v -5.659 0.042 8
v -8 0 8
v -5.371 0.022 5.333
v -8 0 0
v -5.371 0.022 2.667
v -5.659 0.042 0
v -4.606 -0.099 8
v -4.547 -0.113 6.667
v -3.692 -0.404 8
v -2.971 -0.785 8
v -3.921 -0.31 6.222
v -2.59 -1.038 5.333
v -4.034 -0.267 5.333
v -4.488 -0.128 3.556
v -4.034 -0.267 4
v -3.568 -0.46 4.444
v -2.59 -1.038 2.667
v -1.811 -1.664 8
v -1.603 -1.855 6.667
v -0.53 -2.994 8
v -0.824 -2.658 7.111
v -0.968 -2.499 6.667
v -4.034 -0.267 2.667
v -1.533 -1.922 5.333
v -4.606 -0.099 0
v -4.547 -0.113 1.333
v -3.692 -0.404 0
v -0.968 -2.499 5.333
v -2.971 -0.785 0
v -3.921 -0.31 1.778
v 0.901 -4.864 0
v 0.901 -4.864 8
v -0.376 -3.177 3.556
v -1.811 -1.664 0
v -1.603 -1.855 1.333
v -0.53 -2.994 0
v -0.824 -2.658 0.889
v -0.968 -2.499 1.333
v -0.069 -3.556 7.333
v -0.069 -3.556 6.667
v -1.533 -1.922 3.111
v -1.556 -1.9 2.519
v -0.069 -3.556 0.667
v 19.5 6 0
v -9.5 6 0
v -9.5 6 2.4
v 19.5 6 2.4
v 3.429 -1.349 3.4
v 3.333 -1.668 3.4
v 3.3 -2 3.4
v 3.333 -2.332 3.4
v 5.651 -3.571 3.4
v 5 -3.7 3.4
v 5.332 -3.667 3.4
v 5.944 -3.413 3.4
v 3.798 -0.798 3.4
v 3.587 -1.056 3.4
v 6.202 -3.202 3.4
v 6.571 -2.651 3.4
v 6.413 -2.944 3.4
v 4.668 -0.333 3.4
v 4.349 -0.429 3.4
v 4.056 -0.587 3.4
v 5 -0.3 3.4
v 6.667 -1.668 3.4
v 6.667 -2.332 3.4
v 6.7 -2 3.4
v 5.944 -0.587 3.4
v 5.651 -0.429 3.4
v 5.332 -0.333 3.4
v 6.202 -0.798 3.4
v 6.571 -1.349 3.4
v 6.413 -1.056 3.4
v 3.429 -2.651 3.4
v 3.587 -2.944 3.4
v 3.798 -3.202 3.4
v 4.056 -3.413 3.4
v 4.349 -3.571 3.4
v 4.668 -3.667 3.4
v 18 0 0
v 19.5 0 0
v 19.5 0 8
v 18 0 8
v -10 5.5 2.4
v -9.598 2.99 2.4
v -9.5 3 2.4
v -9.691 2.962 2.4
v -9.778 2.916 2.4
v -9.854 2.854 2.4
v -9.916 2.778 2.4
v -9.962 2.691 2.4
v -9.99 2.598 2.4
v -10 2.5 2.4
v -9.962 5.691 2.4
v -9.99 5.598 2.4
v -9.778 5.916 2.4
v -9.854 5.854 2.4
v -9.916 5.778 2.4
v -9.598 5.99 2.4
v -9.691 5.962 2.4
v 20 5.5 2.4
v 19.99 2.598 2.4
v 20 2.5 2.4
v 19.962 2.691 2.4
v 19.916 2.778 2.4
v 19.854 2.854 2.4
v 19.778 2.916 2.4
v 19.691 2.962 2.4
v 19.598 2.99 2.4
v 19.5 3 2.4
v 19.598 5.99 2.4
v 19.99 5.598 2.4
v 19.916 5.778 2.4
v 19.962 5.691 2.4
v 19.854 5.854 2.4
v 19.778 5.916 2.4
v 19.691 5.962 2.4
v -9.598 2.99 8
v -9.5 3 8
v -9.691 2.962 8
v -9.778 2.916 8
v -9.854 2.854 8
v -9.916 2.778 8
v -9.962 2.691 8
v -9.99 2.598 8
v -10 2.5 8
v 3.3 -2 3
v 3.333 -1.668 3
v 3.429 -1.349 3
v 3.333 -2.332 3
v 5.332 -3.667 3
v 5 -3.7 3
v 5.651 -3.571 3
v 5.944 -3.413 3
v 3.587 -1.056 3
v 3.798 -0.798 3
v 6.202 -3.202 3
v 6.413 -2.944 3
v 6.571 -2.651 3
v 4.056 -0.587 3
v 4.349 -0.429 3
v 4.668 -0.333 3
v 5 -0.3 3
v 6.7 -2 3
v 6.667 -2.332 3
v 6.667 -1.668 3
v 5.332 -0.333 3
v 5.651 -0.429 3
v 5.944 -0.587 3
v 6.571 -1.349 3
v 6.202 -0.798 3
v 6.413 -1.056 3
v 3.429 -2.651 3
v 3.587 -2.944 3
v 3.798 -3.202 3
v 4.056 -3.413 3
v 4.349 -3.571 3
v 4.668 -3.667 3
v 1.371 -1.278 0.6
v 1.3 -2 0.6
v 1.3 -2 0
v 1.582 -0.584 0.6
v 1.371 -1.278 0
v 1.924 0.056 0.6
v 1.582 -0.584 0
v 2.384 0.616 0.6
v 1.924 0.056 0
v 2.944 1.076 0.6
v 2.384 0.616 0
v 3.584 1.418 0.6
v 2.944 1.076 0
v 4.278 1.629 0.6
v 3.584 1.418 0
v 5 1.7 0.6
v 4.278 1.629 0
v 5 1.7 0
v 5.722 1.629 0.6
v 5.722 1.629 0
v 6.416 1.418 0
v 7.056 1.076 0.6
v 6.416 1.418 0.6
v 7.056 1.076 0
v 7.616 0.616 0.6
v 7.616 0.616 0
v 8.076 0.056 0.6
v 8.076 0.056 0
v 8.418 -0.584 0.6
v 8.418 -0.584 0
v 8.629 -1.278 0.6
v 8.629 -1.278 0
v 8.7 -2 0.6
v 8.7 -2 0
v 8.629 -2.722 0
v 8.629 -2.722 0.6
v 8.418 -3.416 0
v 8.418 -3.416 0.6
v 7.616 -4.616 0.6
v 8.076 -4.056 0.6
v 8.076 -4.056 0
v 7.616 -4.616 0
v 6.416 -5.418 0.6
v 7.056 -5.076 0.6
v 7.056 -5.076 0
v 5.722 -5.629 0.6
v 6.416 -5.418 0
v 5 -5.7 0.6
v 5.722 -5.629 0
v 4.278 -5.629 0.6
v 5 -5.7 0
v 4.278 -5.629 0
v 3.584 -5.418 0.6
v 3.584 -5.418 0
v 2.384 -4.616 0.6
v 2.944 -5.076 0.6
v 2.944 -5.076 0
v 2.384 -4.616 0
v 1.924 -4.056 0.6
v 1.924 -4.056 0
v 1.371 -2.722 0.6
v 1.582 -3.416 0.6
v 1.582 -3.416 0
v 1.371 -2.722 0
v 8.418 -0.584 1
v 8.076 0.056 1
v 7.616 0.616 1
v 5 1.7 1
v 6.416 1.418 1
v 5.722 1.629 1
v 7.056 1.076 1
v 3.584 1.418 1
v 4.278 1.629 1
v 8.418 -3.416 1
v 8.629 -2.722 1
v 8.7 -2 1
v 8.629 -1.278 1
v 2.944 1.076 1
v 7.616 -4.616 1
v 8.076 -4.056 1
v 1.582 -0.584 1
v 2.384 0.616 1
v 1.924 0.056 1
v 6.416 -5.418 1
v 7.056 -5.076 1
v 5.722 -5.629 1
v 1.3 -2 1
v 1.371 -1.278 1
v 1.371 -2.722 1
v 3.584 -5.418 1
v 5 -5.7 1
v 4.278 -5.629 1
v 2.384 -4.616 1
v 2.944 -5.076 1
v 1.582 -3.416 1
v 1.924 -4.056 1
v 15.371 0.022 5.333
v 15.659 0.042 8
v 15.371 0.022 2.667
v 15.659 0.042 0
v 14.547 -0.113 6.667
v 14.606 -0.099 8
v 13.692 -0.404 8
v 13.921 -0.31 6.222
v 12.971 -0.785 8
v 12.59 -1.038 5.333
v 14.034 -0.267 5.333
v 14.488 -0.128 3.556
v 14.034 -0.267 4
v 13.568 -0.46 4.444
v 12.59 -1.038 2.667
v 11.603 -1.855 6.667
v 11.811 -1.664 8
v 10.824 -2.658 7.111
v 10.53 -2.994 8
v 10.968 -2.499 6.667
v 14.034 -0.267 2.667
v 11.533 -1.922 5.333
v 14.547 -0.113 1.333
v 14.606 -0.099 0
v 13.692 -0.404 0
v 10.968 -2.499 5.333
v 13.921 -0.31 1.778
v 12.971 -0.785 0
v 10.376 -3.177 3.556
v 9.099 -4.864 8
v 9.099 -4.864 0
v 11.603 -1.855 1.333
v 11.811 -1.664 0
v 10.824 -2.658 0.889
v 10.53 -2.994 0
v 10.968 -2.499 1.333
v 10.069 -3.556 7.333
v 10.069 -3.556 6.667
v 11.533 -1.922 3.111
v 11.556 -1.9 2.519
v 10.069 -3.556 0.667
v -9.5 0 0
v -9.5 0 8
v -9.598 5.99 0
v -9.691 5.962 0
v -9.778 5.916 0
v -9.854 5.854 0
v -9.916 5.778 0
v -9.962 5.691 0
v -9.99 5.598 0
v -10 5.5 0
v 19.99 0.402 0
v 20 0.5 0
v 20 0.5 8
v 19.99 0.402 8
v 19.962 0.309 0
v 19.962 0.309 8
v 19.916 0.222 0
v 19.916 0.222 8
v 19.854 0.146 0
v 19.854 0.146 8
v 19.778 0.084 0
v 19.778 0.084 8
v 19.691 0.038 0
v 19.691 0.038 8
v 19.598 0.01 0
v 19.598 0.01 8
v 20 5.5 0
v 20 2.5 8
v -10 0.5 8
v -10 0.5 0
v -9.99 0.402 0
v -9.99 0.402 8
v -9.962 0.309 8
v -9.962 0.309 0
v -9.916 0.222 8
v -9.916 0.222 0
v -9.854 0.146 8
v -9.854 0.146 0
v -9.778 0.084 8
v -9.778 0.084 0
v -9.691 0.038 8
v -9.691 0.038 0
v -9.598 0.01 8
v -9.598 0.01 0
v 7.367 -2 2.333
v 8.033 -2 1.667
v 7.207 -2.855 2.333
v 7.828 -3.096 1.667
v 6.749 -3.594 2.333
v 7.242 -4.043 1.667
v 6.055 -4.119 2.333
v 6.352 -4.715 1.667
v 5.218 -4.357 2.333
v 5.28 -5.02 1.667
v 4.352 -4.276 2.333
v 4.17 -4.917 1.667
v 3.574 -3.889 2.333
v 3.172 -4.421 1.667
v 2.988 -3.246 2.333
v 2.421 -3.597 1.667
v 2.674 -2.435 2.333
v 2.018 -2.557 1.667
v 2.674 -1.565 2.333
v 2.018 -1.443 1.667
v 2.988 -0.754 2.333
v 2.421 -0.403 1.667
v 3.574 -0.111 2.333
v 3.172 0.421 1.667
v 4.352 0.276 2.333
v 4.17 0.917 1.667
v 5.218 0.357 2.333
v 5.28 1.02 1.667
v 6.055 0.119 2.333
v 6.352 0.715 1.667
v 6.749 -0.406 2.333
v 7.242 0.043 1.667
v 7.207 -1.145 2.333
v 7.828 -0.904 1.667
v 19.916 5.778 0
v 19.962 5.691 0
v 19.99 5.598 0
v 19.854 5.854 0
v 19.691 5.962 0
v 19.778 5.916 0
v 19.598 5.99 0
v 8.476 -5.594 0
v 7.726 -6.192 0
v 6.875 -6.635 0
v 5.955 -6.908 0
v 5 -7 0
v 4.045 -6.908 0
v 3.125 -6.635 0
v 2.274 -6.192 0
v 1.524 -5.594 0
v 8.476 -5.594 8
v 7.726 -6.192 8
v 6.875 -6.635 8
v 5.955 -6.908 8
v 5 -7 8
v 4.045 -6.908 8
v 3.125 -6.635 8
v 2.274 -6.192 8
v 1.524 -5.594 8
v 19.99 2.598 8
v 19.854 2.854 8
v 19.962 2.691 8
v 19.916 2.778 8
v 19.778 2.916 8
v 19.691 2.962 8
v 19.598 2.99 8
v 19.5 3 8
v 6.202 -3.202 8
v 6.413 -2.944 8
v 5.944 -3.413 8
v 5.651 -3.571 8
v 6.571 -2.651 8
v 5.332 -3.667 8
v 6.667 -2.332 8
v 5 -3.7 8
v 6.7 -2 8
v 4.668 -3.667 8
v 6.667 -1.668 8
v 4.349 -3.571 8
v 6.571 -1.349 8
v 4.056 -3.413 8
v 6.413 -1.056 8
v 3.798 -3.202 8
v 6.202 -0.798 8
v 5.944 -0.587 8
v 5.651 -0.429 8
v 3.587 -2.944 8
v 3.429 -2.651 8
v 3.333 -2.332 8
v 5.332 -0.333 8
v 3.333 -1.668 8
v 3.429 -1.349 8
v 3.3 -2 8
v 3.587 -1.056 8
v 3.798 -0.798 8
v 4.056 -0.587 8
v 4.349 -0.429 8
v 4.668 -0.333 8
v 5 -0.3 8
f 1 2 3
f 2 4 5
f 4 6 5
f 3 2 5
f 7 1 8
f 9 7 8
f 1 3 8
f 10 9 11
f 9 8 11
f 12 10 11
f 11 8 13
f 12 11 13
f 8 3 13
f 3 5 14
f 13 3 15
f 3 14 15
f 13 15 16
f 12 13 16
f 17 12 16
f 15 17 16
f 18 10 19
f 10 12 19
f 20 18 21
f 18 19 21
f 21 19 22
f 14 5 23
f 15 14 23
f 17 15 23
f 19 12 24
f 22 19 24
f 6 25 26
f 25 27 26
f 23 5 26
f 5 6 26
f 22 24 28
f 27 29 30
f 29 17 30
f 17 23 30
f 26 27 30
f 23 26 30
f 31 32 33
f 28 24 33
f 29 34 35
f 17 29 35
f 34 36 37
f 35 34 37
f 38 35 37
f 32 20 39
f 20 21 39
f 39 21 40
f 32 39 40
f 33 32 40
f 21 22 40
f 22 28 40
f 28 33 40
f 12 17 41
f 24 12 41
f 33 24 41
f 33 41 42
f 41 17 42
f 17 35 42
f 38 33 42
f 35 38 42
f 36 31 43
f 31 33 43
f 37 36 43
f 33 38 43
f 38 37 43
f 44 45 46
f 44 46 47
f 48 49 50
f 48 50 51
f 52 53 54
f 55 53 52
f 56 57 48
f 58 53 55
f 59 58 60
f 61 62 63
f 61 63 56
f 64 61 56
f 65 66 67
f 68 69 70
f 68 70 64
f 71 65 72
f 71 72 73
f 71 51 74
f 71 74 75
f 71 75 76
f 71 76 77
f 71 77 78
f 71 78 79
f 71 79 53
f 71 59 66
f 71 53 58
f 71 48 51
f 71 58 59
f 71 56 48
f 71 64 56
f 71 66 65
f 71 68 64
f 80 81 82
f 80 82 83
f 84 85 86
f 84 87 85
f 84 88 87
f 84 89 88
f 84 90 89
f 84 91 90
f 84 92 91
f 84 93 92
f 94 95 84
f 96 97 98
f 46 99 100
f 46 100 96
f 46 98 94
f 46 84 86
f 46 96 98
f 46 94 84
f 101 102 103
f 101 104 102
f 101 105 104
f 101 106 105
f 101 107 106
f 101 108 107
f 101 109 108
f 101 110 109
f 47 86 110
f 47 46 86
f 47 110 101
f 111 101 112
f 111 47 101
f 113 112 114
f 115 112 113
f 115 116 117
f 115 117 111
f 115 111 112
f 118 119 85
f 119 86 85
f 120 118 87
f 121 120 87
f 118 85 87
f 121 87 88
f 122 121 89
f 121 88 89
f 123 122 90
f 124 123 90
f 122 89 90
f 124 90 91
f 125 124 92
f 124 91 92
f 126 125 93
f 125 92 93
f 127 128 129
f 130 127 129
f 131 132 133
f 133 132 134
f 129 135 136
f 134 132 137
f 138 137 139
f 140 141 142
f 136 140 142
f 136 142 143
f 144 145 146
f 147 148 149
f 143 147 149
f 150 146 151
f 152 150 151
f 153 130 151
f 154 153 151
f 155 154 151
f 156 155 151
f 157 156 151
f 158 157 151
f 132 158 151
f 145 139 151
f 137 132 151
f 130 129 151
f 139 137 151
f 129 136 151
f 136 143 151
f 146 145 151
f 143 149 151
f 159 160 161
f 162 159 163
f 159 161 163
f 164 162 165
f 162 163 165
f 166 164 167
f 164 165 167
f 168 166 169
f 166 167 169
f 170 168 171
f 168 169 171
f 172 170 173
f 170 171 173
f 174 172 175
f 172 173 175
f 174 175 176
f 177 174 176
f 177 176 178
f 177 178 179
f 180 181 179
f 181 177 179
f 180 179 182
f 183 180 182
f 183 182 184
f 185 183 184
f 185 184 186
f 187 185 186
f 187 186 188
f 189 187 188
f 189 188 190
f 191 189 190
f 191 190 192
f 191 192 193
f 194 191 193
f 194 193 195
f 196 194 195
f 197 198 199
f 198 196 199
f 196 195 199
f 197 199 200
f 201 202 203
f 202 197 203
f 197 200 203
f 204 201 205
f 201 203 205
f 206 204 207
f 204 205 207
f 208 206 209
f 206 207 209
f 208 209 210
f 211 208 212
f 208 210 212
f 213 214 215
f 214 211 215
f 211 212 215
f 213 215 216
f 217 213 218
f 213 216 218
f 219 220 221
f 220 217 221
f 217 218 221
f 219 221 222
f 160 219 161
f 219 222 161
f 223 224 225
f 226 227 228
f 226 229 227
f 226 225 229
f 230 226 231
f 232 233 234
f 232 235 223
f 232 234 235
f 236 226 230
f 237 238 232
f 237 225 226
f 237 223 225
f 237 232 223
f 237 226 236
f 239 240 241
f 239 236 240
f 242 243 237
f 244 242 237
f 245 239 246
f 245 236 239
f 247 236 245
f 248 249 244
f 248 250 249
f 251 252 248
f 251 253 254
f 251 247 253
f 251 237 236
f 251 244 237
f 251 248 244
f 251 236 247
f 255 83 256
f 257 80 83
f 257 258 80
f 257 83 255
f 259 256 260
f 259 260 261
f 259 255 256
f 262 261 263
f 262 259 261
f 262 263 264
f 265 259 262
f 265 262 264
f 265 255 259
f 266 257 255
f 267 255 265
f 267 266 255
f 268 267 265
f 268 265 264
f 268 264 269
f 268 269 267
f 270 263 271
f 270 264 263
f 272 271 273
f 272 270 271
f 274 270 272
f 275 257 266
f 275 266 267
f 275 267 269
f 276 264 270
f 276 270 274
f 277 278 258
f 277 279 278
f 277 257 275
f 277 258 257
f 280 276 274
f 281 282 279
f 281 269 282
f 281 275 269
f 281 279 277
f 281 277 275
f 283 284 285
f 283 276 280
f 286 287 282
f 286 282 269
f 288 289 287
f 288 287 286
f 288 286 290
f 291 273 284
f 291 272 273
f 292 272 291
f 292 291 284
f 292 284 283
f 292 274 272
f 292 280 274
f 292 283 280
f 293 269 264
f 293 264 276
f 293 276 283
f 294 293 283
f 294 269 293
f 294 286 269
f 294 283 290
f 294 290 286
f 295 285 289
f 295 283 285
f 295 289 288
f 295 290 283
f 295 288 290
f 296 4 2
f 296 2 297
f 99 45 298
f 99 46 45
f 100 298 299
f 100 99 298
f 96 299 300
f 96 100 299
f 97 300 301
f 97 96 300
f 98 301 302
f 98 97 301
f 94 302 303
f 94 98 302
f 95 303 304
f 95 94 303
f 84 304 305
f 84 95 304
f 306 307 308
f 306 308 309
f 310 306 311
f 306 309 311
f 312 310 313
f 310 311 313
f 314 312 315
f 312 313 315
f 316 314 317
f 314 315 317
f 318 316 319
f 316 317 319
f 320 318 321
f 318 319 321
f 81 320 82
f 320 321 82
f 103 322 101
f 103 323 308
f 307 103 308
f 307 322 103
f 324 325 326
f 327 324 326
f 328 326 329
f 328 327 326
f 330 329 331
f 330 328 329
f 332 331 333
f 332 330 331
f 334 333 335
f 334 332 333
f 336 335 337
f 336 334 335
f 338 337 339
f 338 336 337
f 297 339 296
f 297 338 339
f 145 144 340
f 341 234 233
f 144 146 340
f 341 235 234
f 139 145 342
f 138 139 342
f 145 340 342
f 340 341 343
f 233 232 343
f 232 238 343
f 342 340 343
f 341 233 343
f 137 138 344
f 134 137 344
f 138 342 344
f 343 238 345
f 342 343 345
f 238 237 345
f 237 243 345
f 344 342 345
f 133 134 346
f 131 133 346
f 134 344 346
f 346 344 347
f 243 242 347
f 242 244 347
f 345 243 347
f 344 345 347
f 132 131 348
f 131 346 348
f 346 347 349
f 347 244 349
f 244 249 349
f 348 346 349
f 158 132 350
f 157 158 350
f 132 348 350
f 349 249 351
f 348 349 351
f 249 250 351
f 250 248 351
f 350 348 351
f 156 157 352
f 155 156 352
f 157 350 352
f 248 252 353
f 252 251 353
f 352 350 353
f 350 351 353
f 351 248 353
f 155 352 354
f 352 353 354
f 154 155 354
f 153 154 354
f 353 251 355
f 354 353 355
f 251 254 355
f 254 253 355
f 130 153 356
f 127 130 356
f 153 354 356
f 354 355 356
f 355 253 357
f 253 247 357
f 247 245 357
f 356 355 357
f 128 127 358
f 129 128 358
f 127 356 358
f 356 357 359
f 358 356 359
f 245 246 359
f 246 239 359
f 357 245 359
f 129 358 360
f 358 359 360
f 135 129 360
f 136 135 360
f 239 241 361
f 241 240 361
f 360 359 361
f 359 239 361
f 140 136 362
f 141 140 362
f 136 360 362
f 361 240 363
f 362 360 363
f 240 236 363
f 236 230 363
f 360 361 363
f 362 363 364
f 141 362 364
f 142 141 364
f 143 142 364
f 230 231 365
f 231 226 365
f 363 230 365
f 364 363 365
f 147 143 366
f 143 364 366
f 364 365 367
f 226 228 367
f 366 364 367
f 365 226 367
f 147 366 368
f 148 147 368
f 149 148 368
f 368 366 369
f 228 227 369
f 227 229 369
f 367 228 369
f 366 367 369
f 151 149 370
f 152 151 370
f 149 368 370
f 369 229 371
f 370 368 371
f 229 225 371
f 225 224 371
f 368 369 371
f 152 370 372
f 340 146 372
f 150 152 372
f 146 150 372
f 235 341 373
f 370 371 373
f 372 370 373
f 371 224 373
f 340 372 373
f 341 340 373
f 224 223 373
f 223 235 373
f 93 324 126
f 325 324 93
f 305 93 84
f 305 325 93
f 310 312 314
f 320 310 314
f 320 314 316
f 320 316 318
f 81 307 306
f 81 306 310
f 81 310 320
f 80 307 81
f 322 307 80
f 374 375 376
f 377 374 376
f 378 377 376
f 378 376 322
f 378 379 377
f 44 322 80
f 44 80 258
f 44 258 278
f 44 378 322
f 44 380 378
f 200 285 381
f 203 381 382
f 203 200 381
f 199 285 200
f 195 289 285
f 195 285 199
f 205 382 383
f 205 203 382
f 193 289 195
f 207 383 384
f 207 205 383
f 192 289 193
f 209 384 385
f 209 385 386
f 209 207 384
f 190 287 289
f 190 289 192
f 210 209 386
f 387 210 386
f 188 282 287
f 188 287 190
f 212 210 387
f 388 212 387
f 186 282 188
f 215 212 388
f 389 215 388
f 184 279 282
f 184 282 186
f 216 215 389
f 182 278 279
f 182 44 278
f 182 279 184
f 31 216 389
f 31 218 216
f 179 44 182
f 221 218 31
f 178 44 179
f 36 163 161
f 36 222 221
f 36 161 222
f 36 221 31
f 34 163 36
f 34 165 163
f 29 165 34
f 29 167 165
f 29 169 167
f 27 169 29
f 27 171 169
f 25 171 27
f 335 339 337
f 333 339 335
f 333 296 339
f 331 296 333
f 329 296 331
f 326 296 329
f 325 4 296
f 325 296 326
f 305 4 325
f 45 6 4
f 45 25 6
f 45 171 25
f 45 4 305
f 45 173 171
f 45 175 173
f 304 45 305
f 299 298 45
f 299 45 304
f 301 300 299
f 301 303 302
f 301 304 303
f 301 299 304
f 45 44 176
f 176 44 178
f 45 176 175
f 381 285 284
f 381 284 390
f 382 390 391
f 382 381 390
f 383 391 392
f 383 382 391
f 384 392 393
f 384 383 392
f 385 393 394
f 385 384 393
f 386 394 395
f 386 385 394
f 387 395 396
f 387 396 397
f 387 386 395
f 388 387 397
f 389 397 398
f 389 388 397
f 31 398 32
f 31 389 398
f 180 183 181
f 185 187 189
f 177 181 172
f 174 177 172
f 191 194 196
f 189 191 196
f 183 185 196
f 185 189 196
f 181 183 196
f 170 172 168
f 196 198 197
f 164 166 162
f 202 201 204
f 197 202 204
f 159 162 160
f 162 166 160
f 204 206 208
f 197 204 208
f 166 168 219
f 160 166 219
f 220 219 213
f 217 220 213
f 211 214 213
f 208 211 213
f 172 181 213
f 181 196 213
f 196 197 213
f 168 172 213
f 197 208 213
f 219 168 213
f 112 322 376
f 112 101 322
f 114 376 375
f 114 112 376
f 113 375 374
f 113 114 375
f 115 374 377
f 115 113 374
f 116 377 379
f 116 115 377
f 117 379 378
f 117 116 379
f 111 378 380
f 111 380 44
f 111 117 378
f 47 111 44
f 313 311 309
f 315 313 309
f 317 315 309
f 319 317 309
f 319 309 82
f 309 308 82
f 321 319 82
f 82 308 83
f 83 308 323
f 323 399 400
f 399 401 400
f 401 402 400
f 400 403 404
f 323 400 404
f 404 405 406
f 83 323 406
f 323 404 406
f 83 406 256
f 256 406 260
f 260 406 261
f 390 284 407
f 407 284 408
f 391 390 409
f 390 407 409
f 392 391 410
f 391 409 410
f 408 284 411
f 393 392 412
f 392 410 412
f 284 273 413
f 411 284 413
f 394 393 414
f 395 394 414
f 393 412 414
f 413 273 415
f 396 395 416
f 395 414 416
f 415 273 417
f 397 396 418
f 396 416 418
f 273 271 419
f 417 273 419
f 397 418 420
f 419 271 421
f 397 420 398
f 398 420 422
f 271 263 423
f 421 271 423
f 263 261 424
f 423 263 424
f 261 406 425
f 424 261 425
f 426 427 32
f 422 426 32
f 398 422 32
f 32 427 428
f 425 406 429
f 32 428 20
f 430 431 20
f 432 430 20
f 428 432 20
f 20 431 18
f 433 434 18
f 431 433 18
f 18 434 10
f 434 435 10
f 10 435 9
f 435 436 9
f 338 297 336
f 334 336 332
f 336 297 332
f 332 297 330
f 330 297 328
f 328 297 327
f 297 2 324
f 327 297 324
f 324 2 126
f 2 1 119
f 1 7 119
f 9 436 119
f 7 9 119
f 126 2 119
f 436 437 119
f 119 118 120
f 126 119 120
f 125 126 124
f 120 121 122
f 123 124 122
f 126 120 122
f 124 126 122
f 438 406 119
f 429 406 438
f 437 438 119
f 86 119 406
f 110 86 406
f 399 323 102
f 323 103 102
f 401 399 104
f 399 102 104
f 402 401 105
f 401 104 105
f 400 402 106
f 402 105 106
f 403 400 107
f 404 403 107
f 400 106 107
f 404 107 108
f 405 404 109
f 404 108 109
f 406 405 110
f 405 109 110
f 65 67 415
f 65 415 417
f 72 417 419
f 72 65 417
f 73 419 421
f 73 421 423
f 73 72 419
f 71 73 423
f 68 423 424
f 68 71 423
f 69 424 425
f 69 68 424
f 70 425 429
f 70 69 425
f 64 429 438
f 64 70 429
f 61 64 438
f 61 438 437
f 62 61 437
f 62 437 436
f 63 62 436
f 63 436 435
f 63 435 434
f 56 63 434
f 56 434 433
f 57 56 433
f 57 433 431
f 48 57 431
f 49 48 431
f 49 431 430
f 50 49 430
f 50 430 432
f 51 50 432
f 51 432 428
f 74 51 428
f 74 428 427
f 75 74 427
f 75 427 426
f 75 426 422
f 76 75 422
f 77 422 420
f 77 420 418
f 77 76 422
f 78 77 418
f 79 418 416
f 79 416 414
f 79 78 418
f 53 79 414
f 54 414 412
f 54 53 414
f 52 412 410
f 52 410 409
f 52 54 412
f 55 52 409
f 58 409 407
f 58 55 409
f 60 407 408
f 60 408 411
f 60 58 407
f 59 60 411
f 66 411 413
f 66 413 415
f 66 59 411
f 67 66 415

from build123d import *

# Parameters (mm, degrees)
SKETCH1_R           = 1.7
BOSS_EXTRUDE1_DEPTH = 8
SKETCH2_W           = 30
SKETCH2_H           = 3
CUT_EXTRUDE1_DEPTH  = 5.6
FILLET1_R           = 0.5
SKETCH5_R           = 3.7
CUT_EXTRUDE2_DEPTH  = 1
CHAMFER1_SIZE       = 2
SKETCH6_R           = 1.7
BOSS_EXTRUDE2_DEPTH = 0.4
BOSS_EXTRUDE3_START = -0.4
SKETCH7_R           = 3.7
BOSS_EXTRUDE3_DEPTH = 0.4


with BuildPart() as part:
    # Sketch1 → Boss-Extrude1 (new body)
    with BuildSketch(Plane.XY):
        with BuildLine():
            Line((20, 6), (20, 0))
            Line((20, 0), (18, 0))
            add(Edge.make_bspline(
                [(18, 0), (15.260318753, 0), (13.131354564, 0.908049894), (9.098678762, -4.863709553)],
                knots=[0, 0, 0, 0, 1, 1, 1, 1], degree=3))
            ThreePointArc((9.098678762, -4.863709553), (5, -7), (0.901321238, -4.863709553))
            add(Edge.make_bspline(
                [(-8, 0), (-5.260318753, 0), (-3.131354564, 0.908049894), (0.901321238, -4.863709553)],
                knots=[0, 0, 0, 0, 1, 1, 1, 1], degree=3))
            Line((-8, 0), (-10, 0))
            Line((-10, 0), (-10, 6))
            Line((-10, 6), (20, 6))
        make_face()
        with Locations((5, -2)):
            Circle(SKETCH1_R, mode=Mode.SUBTRACT)
    extrude(amount=BOSS_EXTRUDE1_DEPTH)

    # Sketch2 → Cut-Extrude1 (cut)
    with BuildSketch(Plane.XY.offset(8)):
        with Locations((5, 4.5)):
            Rectangle(SKETCH2_W, SKETCH2_H)
    extrude(amount=-CUT_EXTRUDE1_DEPTH, mode=Mode.SUBTRACT)

    # Fillet1
    fillet1_edges = [part.edges().sort_by_distance(p)[0] for p in [
        (20, 0, 4),
        (-10, 0, 4),
        (20, 6, 1.2),
        (-10, 6, 1.2),
        (20, 3, 5.2),
        (-10, 3, 5.2),
    ]]
    fillet(fillet1_edges, radius=FILLET1_R)

    # Sketch5 → Cut-Extrude2 (cut)
    with BuildSketch(Plane(origin=(0, 0, 0), x_dir=(-1, 0, 0), z_dir=(0, 0, -1))):
        with Locations((-5, -2)):
            Circle(SKETCH5_R)
    extrude(amount=-CUT_EXTRUDE2_DEPTH, mode=Mode.SUBTRACT)

    # Chamfer1
    chamfer1_edges = [part.edges().sort_by_distance(p)[0] for p in [
        (3.3, -2, 1),
    ]]
    chamfer(chamfer1_edges, length=CHAMFER1_SIZE - 0.0001)  # a hair under: the kernel refuses the full size

    # Sketch6 → Boss-Extrude2 (add)
    with BuildSketch(Plane.XY.offset(3)):
        with Locations((5, -2)):
            Circle(SKETCH6_R)
    extrude(amount=BOSS_EXTRUDE2_DEPTH)

    # Sketch7 → Boss-Extrude3 (add)
    with BuildSketch(Plane.XY.offset(1).offset(BOSS_EXTRUDE3_START)):
        with Locations(Location((5, -2, 0), (0, 0, 180))):
            Circle(SKETCH7_R)
    extrude(amount=BOSS_EXTRUDE3_DEPTH)


solid = part.part
